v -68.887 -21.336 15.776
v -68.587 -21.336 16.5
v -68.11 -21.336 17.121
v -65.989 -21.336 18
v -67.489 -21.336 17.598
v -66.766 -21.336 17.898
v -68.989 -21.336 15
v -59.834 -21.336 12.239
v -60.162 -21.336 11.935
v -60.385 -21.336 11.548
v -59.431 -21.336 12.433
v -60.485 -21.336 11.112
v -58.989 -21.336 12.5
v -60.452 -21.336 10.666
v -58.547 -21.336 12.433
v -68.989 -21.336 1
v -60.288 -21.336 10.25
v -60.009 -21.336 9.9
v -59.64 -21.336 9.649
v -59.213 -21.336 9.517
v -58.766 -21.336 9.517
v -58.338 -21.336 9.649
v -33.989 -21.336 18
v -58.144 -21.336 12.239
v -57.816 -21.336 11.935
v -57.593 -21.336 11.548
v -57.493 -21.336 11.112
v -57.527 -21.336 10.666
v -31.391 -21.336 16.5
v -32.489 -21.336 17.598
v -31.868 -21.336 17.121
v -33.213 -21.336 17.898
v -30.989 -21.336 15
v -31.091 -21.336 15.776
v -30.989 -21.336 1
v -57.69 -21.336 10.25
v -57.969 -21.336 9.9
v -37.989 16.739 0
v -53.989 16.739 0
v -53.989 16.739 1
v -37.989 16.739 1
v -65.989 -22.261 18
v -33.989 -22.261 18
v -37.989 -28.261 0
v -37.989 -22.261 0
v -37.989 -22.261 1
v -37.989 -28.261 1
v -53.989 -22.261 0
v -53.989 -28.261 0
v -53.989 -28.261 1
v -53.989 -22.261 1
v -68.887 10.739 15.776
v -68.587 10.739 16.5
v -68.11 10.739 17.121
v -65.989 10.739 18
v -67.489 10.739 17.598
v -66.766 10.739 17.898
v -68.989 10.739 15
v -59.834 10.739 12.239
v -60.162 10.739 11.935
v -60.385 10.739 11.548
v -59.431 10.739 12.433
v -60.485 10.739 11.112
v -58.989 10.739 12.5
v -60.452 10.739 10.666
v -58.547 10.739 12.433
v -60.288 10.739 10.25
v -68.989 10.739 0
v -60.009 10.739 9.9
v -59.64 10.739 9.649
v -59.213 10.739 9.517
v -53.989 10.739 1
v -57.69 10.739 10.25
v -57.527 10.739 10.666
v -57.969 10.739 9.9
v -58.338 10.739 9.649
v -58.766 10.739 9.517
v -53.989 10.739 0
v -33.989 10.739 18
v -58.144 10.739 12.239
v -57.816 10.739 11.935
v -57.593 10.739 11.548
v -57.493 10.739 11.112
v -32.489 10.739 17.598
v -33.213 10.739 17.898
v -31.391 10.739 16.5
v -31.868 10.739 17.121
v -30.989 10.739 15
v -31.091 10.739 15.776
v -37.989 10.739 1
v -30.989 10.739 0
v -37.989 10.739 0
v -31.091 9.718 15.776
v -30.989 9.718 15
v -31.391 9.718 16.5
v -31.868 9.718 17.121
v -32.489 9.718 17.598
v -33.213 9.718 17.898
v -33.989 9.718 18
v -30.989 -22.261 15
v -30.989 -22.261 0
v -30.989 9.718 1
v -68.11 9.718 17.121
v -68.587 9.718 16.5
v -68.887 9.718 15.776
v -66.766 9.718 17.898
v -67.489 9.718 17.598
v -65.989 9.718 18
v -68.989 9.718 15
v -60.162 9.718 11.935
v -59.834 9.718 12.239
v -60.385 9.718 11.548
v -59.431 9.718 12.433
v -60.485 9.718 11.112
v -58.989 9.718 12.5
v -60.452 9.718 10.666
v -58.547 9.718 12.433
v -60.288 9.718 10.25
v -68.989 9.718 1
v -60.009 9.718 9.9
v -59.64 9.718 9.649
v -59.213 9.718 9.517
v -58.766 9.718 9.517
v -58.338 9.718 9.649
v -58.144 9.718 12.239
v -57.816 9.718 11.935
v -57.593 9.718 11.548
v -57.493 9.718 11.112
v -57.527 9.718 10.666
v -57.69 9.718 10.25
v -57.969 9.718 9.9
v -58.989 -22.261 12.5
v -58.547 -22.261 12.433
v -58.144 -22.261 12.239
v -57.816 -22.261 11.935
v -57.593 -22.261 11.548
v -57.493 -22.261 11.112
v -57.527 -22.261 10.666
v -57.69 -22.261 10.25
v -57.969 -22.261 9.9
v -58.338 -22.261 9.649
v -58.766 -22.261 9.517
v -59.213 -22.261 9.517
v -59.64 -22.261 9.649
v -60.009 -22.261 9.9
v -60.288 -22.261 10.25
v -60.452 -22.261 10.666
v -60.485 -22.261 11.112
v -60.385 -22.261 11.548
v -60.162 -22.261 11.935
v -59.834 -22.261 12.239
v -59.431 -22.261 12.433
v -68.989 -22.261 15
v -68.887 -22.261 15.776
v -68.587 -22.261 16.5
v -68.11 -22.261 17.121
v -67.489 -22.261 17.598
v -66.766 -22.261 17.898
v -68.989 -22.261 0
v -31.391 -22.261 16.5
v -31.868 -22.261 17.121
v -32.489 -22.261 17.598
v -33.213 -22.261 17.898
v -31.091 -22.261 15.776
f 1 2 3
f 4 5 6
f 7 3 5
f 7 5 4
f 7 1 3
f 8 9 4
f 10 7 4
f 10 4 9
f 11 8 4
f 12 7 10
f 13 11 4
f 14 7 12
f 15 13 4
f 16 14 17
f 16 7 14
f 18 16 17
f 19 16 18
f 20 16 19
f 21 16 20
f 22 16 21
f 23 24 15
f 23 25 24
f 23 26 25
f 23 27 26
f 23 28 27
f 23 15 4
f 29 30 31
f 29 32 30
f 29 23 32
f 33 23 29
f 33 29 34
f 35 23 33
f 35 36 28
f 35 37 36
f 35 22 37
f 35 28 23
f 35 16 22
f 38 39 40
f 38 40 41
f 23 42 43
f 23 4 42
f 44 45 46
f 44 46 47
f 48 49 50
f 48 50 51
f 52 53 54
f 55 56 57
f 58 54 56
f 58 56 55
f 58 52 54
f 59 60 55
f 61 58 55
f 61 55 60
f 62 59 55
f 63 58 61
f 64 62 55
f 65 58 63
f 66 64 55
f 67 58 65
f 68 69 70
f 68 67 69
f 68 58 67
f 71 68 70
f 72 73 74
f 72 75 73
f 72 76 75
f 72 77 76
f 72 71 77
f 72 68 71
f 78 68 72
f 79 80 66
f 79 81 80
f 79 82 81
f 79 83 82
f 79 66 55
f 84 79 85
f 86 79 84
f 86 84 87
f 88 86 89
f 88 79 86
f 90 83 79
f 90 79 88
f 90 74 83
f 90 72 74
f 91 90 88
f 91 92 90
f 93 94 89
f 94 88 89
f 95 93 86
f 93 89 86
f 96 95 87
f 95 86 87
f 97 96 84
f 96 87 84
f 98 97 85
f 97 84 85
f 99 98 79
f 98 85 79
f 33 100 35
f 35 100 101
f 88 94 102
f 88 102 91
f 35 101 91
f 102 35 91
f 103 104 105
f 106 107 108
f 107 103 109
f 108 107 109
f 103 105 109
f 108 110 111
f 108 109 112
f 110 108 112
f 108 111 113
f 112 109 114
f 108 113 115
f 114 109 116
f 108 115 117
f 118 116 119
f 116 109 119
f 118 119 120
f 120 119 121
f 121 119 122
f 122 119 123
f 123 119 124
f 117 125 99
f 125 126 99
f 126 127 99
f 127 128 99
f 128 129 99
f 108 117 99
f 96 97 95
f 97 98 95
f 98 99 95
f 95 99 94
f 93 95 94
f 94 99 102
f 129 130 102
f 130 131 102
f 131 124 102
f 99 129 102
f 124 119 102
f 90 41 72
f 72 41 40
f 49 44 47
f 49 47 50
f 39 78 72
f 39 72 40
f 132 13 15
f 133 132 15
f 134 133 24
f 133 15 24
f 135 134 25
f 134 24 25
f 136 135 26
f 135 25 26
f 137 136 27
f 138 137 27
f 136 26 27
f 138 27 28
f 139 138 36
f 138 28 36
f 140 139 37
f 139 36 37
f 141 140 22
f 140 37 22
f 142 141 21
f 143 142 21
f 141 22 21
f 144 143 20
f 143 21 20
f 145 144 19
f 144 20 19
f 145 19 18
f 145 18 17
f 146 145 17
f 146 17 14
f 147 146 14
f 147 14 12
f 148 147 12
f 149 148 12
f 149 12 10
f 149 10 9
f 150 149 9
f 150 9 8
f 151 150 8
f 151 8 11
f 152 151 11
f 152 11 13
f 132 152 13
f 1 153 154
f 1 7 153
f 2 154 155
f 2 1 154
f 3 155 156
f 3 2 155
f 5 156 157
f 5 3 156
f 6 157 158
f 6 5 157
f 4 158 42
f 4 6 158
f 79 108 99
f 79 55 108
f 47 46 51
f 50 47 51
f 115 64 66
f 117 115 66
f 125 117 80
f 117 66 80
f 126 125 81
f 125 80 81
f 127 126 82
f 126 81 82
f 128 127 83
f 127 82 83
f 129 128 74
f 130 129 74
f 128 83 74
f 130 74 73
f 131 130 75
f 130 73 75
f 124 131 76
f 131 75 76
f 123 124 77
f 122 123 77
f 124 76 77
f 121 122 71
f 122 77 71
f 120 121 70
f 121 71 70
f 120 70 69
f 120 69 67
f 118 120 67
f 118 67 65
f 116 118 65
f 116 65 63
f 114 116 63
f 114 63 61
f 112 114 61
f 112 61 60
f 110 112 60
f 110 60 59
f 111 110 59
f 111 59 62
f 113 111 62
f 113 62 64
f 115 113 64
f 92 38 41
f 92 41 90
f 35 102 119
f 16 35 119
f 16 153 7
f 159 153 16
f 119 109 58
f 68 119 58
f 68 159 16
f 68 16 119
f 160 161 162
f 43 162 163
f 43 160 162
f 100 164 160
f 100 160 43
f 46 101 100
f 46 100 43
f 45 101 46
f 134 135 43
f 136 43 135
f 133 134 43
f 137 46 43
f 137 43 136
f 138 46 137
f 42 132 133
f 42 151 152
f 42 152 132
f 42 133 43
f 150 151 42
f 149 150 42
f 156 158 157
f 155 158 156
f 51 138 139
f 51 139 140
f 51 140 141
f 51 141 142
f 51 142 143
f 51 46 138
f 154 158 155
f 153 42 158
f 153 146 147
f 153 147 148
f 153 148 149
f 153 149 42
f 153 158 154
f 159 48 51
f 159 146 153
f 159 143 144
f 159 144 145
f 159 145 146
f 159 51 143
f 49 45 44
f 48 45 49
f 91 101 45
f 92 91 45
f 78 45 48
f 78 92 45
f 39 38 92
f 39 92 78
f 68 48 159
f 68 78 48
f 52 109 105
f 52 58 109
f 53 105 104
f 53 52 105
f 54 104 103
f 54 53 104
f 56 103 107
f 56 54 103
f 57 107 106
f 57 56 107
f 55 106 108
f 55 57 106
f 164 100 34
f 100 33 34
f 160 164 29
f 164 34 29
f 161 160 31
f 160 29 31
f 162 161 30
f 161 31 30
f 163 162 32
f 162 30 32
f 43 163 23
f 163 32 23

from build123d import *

# Parameters (mm, degrees)
EXTRUSION1_DEPTH        = 1
ESQUISSE14_W            = 38
ESQUISSE14_H            = 1.021269028
ESQUISSE14_H_2          = 0.92452696
EXTRUSION2_DEPTH        = 17
CONG_3_R                = 3
ESQUISSE20_R            = 1.551729924
ESQUISSE20_R_2          = 1.5
ENL_V_MAT_EXTRU_7_DEPTH = 46


with BuildPart() as part:
    # Esquisse1 → Extrusion1 (new body)
    with BuildSketch(Plane.XY):
        Polygon((-30.989172535, 10.739018032), (-30.989172535, -22.260981968), (-37.989172535, -22.260981968), (-37.989172535, -28.260981968), (-53.989172535, -28.260981968), (-53.989172535, -22.260981968), (-68.989172535, -22.260981968), (-68.989172535, 10.739018032), (-53.989172535, 10.739018032), (-53.989172535, 16.739018032), (-37.989172535, 16.739018032), (-37.989172535, 10.739018032), align=None)
    extrude(amount=EXTRUSION1_DEPTH)

    # Esquisse14 → Extrusion2 (add)
    with BuildSketch(Plane.XY.offset(1)):
        with Locations((-49.989172535, 10.228383518)):
            Rectangle(ESQUISSE14_W, ESQUISSE14_H)
        with Locations((-49.989172535, -21.798718488)):
            Rectangle(ESQUISSE14_W, ESQUISSE14_H_2)
    extrude(amount=EXTRUSION2_DEPTH)

    # Congé3
    cong_3_edges = [part.edges().sort_by_distance(p)[0] for p in [
        (-68.989172535, -21.798718488, 18),
        (-30.989172535, -21.798718488, 18),
        (-30.989172535, 10.228383518, 18),
        (-68.989172535, 10.228383518, 18),
    ]]
    fillet(cong_3_edges, radius=CONG_3_R)

    # Esquisse20 → Enlèv. mat.-Extru.7 (cut)
    with BuildSketch(Plane(origin=(0, 10.739018032, 0), x_dir=(-1, 0, 0), z_dir=(0, 1, 0))):
        with Locations((109.664285954, 11.585691392)):
            Circle(ESQUISSE20_R)
        with Locations(Location((58.989172535, 11, 0), (0, 0, 90))):
            Circle(ESQUISSE20_R_2)
    extrude(amount=-ENL_V_MAT_EXTRU_7_DEPTH, mode=Mode.SUBTRACT)


solid = part.part
